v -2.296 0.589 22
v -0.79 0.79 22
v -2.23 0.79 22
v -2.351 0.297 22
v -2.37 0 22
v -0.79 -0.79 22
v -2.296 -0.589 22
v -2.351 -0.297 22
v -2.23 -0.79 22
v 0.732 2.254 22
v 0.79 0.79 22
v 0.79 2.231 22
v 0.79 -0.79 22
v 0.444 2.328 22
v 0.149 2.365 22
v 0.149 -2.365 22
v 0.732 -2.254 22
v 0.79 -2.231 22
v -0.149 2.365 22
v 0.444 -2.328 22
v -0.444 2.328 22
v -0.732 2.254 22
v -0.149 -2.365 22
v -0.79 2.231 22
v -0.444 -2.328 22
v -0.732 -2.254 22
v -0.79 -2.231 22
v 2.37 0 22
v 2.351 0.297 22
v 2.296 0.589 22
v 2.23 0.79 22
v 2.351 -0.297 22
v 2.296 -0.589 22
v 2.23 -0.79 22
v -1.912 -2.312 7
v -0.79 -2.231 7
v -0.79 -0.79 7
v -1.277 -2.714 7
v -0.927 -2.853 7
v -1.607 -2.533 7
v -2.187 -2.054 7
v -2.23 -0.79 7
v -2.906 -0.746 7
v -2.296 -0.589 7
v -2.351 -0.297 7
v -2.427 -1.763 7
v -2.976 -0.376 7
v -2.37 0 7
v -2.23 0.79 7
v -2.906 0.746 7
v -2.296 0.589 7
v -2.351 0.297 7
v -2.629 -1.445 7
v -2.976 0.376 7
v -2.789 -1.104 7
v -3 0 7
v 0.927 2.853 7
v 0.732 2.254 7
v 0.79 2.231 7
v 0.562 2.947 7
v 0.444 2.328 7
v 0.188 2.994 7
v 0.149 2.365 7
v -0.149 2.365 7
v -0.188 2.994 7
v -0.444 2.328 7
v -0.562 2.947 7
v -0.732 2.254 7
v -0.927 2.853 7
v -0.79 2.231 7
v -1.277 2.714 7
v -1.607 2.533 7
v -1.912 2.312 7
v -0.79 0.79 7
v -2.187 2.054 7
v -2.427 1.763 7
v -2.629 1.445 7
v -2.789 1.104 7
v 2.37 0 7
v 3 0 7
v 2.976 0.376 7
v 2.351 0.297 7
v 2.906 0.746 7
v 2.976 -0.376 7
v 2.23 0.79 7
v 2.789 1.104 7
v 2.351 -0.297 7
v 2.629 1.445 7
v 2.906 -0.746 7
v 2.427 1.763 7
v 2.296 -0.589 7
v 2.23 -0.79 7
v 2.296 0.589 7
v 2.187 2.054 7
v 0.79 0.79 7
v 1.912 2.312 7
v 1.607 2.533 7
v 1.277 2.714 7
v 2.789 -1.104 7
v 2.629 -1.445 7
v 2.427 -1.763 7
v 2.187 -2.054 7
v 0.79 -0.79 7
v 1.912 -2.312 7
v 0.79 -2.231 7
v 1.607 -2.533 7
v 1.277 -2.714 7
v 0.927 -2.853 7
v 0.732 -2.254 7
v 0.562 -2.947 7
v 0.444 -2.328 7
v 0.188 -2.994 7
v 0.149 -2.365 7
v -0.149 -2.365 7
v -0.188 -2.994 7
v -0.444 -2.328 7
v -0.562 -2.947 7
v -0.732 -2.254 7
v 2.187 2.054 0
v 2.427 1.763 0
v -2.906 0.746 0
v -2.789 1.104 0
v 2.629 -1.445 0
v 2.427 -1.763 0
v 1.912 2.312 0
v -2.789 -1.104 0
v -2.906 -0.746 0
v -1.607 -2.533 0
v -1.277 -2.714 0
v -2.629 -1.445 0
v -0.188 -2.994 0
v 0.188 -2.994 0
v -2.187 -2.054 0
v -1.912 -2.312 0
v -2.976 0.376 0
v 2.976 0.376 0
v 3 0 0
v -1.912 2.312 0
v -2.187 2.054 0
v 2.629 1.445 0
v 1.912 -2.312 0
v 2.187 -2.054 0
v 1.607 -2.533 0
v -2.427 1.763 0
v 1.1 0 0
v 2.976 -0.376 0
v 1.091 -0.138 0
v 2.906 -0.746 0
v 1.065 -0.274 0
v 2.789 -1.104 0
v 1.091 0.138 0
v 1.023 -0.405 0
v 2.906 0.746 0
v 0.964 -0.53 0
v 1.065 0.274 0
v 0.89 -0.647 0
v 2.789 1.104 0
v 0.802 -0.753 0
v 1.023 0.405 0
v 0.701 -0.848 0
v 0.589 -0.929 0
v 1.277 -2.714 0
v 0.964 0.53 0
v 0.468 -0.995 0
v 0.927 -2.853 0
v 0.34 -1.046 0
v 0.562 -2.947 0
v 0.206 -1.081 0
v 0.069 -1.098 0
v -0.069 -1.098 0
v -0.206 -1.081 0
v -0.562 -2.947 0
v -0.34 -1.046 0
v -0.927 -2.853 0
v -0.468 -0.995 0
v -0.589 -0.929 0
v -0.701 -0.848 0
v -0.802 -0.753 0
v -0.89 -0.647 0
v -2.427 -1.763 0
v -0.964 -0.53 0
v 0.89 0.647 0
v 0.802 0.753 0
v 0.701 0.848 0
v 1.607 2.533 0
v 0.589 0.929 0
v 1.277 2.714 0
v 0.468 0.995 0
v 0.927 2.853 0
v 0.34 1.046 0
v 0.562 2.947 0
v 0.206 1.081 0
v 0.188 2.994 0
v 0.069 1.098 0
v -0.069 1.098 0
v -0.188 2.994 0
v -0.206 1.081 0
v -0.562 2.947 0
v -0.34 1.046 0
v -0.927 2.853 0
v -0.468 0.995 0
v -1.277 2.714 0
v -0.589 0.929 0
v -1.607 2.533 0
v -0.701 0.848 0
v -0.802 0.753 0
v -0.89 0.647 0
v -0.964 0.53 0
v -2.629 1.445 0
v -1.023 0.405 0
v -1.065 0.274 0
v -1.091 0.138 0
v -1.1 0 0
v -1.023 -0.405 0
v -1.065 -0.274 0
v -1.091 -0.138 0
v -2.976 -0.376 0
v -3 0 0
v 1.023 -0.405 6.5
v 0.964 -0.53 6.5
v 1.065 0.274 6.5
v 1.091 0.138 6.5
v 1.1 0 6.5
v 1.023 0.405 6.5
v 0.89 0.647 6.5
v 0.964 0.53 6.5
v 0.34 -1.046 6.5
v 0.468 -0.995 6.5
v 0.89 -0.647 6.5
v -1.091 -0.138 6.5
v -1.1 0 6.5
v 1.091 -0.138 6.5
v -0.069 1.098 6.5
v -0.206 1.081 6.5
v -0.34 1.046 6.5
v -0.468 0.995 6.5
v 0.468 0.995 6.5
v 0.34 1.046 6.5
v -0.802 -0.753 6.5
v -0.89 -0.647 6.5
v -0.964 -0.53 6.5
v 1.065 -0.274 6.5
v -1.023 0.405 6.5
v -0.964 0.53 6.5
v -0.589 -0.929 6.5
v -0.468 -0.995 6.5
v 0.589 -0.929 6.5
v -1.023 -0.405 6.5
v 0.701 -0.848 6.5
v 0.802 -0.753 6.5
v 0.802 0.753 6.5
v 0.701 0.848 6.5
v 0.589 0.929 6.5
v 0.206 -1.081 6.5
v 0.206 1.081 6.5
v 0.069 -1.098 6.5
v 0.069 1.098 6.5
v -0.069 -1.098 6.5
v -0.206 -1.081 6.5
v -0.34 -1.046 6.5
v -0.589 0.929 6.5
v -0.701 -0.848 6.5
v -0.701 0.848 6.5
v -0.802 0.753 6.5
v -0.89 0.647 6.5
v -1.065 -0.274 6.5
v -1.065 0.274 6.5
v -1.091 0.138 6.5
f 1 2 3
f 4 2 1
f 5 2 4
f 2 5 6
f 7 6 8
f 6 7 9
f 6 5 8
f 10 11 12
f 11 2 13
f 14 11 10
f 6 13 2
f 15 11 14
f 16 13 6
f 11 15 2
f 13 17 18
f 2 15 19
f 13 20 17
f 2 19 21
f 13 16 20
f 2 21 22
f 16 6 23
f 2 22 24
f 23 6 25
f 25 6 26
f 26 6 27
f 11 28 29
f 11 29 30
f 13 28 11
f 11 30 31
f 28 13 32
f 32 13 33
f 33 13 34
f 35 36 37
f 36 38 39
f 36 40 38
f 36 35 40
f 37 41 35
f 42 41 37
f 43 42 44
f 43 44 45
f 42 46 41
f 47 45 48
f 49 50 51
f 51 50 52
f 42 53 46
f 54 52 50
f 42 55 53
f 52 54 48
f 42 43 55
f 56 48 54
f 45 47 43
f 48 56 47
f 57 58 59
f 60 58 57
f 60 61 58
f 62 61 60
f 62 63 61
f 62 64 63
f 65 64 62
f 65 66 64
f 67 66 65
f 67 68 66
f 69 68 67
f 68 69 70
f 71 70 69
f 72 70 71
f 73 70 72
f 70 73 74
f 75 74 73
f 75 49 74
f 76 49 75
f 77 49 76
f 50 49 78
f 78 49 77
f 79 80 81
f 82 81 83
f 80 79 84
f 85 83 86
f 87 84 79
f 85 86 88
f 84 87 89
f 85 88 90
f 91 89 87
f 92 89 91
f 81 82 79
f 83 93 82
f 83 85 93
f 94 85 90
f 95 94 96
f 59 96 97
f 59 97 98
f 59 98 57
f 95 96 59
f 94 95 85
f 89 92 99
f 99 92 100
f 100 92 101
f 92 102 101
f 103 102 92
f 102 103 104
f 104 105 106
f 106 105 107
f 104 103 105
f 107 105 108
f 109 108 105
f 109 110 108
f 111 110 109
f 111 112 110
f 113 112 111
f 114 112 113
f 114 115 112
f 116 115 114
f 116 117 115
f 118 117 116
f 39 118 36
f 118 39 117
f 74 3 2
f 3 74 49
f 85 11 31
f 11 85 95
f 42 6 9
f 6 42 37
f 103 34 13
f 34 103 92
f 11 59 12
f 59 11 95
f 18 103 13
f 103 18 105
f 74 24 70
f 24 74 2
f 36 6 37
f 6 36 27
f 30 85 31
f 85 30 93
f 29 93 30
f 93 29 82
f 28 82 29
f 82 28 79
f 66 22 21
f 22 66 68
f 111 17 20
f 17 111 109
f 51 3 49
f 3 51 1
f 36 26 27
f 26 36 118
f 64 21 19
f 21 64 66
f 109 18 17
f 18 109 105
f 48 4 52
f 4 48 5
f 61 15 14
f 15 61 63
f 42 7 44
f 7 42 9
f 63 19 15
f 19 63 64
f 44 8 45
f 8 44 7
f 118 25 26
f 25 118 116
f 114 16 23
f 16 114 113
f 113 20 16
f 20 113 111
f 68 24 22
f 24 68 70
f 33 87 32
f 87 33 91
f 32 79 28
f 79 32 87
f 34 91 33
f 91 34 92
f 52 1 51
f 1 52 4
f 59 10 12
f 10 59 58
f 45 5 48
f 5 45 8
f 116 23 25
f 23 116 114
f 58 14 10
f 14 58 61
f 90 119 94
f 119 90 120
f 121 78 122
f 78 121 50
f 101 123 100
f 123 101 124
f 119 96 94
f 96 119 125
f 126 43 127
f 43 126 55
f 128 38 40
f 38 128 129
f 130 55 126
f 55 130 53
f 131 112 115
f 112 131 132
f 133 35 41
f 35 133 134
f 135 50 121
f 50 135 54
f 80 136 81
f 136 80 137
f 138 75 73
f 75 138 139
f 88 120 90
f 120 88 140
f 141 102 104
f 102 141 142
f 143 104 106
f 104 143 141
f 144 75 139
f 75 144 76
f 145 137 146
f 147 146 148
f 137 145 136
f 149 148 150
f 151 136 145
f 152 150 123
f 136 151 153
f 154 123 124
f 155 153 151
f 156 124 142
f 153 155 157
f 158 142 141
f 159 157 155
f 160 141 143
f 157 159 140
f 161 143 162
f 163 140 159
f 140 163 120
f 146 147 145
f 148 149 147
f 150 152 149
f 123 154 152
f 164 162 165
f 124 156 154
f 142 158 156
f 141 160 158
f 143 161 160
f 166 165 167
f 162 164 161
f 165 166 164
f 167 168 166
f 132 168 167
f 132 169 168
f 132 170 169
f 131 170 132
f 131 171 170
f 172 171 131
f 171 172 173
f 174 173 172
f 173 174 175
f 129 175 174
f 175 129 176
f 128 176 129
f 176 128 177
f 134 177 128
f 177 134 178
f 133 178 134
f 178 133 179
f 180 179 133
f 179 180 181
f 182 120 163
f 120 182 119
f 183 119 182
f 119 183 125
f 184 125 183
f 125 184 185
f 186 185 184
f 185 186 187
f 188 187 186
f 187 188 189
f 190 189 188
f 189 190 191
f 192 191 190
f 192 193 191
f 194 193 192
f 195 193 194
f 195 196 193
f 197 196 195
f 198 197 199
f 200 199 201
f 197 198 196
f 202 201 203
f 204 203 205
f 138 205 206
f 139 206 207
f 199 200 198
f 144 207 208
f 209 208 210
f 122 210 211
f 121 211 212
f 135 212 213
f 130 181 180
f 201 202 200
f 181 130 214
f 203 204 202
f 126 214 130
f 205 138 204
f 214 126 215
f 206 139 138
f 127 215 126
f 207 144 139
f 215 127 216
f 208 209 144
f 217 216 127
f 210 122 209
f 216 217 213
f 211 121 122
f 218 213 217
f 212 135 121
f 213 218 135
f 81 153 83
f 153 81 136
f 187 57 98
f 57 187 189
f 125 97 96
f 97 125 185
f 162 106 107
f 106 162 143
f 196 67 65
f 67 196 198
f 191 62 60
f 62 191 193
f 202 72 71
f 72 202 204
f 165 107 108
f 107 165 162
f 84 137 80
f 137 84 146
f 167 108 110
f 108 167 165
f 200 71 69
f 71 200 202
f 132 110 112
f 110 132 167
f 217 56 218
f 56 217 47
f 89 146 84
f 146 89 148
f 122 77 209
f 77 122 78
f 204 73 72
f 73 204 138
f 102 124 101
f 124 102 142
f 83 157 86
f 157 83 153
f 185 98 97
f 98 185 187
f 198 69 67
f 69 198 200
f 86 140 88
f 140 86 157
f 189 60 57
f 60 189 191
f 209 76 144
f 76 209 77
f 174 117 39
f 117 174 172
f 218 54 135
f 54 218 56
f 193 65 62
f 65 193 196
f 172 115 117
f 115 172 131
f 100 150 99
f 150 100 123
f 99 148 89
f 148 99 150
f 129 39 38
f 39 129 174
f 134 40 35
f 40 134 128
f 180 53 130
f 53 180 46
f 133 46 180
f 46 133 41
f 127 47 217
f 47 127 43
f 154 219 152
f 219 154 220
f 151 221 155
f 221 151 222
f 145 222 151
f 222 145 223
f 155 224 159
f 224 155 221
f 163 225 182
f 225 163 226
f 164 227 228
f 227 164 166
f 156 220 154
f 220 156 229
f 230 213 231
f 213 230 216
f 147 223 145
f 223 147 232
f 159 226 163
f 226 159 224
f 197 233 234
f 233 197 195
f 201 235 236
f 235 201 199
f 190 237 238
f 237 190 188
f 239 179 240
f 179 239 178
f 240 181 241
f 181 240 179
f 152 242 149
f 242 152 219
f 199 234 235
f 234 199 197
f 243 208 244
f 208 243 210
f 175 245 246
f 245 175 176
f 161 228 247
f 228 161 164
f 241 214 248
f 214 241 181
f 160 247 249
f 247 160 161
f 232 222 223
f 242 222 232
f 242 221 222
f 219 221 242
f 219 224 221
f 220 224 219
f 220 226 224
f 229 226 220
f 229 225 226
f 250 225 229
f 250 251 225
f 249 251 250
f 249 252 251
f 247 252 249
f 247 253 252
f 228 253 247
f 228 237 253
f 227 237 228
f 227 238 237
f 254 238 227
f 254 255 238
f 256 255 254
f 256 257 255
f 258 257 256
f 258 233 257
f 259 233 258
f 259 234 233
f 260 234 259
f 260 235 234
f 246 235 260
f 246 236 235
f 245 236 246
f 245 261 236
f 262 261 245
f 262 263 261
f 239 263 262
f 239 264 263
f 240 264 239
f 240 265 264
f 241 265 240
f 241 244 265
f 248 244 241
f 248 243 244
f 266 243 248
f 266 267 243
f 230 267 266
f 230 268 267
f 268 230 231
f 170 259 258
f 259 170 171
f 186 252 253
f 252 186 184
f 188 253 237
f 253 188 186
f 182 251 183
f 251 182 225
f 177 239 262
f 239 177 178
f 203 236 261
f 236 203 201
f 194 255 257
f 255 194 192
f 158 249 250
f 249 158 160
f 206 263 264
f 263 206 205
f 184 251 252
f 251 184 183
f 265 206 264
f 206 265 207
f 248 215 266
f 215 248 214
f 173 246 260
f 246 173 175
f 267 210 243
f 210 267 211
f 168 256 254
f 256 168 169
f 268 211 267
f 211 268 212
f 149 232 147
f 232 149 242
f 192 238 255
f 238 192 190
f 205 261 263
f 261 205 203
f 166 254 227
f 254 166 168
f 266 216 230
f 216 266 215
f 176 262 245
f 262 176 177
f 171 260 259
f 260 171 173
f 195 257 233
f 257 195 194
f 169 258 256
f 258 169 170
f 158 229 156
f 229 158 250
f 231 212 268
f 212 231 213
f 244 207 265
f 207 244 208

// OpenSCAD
base_length = 7;
base_diameter = 6;
shaft_length = 15;
hole_length = 6.5;
hole_diameter = 2.2; // 2.2mm hole appears to be good tight fit for motor shaft (maybe slightly too tight?)

shaft_xy_rescale = 1.0; // multiplicative factor to rescale the official technic dimensions

difference() {
    union() {
        translate([0,0,base_length]) scale([shaft_xy_rescale,shaft_xy_rescale,1]) technic_x(shaft_length);  
                                                                // technic cross head
        cylinder(base_length,d=base_diameter,true,$fn=50);      // base cylinder
    }
    cylinder(hole_length,d=hole_diameter,true,$fn=50);          
}

module technic_x (length=20) {
    intersection() {
        cylinder(length,d=4.74,true,$fn=50);
    
        translate([0,0,(length/2)]) {
            cube([5,1.58,length], true);
            cube([1.58,5,length], true);
        }
    }
}
